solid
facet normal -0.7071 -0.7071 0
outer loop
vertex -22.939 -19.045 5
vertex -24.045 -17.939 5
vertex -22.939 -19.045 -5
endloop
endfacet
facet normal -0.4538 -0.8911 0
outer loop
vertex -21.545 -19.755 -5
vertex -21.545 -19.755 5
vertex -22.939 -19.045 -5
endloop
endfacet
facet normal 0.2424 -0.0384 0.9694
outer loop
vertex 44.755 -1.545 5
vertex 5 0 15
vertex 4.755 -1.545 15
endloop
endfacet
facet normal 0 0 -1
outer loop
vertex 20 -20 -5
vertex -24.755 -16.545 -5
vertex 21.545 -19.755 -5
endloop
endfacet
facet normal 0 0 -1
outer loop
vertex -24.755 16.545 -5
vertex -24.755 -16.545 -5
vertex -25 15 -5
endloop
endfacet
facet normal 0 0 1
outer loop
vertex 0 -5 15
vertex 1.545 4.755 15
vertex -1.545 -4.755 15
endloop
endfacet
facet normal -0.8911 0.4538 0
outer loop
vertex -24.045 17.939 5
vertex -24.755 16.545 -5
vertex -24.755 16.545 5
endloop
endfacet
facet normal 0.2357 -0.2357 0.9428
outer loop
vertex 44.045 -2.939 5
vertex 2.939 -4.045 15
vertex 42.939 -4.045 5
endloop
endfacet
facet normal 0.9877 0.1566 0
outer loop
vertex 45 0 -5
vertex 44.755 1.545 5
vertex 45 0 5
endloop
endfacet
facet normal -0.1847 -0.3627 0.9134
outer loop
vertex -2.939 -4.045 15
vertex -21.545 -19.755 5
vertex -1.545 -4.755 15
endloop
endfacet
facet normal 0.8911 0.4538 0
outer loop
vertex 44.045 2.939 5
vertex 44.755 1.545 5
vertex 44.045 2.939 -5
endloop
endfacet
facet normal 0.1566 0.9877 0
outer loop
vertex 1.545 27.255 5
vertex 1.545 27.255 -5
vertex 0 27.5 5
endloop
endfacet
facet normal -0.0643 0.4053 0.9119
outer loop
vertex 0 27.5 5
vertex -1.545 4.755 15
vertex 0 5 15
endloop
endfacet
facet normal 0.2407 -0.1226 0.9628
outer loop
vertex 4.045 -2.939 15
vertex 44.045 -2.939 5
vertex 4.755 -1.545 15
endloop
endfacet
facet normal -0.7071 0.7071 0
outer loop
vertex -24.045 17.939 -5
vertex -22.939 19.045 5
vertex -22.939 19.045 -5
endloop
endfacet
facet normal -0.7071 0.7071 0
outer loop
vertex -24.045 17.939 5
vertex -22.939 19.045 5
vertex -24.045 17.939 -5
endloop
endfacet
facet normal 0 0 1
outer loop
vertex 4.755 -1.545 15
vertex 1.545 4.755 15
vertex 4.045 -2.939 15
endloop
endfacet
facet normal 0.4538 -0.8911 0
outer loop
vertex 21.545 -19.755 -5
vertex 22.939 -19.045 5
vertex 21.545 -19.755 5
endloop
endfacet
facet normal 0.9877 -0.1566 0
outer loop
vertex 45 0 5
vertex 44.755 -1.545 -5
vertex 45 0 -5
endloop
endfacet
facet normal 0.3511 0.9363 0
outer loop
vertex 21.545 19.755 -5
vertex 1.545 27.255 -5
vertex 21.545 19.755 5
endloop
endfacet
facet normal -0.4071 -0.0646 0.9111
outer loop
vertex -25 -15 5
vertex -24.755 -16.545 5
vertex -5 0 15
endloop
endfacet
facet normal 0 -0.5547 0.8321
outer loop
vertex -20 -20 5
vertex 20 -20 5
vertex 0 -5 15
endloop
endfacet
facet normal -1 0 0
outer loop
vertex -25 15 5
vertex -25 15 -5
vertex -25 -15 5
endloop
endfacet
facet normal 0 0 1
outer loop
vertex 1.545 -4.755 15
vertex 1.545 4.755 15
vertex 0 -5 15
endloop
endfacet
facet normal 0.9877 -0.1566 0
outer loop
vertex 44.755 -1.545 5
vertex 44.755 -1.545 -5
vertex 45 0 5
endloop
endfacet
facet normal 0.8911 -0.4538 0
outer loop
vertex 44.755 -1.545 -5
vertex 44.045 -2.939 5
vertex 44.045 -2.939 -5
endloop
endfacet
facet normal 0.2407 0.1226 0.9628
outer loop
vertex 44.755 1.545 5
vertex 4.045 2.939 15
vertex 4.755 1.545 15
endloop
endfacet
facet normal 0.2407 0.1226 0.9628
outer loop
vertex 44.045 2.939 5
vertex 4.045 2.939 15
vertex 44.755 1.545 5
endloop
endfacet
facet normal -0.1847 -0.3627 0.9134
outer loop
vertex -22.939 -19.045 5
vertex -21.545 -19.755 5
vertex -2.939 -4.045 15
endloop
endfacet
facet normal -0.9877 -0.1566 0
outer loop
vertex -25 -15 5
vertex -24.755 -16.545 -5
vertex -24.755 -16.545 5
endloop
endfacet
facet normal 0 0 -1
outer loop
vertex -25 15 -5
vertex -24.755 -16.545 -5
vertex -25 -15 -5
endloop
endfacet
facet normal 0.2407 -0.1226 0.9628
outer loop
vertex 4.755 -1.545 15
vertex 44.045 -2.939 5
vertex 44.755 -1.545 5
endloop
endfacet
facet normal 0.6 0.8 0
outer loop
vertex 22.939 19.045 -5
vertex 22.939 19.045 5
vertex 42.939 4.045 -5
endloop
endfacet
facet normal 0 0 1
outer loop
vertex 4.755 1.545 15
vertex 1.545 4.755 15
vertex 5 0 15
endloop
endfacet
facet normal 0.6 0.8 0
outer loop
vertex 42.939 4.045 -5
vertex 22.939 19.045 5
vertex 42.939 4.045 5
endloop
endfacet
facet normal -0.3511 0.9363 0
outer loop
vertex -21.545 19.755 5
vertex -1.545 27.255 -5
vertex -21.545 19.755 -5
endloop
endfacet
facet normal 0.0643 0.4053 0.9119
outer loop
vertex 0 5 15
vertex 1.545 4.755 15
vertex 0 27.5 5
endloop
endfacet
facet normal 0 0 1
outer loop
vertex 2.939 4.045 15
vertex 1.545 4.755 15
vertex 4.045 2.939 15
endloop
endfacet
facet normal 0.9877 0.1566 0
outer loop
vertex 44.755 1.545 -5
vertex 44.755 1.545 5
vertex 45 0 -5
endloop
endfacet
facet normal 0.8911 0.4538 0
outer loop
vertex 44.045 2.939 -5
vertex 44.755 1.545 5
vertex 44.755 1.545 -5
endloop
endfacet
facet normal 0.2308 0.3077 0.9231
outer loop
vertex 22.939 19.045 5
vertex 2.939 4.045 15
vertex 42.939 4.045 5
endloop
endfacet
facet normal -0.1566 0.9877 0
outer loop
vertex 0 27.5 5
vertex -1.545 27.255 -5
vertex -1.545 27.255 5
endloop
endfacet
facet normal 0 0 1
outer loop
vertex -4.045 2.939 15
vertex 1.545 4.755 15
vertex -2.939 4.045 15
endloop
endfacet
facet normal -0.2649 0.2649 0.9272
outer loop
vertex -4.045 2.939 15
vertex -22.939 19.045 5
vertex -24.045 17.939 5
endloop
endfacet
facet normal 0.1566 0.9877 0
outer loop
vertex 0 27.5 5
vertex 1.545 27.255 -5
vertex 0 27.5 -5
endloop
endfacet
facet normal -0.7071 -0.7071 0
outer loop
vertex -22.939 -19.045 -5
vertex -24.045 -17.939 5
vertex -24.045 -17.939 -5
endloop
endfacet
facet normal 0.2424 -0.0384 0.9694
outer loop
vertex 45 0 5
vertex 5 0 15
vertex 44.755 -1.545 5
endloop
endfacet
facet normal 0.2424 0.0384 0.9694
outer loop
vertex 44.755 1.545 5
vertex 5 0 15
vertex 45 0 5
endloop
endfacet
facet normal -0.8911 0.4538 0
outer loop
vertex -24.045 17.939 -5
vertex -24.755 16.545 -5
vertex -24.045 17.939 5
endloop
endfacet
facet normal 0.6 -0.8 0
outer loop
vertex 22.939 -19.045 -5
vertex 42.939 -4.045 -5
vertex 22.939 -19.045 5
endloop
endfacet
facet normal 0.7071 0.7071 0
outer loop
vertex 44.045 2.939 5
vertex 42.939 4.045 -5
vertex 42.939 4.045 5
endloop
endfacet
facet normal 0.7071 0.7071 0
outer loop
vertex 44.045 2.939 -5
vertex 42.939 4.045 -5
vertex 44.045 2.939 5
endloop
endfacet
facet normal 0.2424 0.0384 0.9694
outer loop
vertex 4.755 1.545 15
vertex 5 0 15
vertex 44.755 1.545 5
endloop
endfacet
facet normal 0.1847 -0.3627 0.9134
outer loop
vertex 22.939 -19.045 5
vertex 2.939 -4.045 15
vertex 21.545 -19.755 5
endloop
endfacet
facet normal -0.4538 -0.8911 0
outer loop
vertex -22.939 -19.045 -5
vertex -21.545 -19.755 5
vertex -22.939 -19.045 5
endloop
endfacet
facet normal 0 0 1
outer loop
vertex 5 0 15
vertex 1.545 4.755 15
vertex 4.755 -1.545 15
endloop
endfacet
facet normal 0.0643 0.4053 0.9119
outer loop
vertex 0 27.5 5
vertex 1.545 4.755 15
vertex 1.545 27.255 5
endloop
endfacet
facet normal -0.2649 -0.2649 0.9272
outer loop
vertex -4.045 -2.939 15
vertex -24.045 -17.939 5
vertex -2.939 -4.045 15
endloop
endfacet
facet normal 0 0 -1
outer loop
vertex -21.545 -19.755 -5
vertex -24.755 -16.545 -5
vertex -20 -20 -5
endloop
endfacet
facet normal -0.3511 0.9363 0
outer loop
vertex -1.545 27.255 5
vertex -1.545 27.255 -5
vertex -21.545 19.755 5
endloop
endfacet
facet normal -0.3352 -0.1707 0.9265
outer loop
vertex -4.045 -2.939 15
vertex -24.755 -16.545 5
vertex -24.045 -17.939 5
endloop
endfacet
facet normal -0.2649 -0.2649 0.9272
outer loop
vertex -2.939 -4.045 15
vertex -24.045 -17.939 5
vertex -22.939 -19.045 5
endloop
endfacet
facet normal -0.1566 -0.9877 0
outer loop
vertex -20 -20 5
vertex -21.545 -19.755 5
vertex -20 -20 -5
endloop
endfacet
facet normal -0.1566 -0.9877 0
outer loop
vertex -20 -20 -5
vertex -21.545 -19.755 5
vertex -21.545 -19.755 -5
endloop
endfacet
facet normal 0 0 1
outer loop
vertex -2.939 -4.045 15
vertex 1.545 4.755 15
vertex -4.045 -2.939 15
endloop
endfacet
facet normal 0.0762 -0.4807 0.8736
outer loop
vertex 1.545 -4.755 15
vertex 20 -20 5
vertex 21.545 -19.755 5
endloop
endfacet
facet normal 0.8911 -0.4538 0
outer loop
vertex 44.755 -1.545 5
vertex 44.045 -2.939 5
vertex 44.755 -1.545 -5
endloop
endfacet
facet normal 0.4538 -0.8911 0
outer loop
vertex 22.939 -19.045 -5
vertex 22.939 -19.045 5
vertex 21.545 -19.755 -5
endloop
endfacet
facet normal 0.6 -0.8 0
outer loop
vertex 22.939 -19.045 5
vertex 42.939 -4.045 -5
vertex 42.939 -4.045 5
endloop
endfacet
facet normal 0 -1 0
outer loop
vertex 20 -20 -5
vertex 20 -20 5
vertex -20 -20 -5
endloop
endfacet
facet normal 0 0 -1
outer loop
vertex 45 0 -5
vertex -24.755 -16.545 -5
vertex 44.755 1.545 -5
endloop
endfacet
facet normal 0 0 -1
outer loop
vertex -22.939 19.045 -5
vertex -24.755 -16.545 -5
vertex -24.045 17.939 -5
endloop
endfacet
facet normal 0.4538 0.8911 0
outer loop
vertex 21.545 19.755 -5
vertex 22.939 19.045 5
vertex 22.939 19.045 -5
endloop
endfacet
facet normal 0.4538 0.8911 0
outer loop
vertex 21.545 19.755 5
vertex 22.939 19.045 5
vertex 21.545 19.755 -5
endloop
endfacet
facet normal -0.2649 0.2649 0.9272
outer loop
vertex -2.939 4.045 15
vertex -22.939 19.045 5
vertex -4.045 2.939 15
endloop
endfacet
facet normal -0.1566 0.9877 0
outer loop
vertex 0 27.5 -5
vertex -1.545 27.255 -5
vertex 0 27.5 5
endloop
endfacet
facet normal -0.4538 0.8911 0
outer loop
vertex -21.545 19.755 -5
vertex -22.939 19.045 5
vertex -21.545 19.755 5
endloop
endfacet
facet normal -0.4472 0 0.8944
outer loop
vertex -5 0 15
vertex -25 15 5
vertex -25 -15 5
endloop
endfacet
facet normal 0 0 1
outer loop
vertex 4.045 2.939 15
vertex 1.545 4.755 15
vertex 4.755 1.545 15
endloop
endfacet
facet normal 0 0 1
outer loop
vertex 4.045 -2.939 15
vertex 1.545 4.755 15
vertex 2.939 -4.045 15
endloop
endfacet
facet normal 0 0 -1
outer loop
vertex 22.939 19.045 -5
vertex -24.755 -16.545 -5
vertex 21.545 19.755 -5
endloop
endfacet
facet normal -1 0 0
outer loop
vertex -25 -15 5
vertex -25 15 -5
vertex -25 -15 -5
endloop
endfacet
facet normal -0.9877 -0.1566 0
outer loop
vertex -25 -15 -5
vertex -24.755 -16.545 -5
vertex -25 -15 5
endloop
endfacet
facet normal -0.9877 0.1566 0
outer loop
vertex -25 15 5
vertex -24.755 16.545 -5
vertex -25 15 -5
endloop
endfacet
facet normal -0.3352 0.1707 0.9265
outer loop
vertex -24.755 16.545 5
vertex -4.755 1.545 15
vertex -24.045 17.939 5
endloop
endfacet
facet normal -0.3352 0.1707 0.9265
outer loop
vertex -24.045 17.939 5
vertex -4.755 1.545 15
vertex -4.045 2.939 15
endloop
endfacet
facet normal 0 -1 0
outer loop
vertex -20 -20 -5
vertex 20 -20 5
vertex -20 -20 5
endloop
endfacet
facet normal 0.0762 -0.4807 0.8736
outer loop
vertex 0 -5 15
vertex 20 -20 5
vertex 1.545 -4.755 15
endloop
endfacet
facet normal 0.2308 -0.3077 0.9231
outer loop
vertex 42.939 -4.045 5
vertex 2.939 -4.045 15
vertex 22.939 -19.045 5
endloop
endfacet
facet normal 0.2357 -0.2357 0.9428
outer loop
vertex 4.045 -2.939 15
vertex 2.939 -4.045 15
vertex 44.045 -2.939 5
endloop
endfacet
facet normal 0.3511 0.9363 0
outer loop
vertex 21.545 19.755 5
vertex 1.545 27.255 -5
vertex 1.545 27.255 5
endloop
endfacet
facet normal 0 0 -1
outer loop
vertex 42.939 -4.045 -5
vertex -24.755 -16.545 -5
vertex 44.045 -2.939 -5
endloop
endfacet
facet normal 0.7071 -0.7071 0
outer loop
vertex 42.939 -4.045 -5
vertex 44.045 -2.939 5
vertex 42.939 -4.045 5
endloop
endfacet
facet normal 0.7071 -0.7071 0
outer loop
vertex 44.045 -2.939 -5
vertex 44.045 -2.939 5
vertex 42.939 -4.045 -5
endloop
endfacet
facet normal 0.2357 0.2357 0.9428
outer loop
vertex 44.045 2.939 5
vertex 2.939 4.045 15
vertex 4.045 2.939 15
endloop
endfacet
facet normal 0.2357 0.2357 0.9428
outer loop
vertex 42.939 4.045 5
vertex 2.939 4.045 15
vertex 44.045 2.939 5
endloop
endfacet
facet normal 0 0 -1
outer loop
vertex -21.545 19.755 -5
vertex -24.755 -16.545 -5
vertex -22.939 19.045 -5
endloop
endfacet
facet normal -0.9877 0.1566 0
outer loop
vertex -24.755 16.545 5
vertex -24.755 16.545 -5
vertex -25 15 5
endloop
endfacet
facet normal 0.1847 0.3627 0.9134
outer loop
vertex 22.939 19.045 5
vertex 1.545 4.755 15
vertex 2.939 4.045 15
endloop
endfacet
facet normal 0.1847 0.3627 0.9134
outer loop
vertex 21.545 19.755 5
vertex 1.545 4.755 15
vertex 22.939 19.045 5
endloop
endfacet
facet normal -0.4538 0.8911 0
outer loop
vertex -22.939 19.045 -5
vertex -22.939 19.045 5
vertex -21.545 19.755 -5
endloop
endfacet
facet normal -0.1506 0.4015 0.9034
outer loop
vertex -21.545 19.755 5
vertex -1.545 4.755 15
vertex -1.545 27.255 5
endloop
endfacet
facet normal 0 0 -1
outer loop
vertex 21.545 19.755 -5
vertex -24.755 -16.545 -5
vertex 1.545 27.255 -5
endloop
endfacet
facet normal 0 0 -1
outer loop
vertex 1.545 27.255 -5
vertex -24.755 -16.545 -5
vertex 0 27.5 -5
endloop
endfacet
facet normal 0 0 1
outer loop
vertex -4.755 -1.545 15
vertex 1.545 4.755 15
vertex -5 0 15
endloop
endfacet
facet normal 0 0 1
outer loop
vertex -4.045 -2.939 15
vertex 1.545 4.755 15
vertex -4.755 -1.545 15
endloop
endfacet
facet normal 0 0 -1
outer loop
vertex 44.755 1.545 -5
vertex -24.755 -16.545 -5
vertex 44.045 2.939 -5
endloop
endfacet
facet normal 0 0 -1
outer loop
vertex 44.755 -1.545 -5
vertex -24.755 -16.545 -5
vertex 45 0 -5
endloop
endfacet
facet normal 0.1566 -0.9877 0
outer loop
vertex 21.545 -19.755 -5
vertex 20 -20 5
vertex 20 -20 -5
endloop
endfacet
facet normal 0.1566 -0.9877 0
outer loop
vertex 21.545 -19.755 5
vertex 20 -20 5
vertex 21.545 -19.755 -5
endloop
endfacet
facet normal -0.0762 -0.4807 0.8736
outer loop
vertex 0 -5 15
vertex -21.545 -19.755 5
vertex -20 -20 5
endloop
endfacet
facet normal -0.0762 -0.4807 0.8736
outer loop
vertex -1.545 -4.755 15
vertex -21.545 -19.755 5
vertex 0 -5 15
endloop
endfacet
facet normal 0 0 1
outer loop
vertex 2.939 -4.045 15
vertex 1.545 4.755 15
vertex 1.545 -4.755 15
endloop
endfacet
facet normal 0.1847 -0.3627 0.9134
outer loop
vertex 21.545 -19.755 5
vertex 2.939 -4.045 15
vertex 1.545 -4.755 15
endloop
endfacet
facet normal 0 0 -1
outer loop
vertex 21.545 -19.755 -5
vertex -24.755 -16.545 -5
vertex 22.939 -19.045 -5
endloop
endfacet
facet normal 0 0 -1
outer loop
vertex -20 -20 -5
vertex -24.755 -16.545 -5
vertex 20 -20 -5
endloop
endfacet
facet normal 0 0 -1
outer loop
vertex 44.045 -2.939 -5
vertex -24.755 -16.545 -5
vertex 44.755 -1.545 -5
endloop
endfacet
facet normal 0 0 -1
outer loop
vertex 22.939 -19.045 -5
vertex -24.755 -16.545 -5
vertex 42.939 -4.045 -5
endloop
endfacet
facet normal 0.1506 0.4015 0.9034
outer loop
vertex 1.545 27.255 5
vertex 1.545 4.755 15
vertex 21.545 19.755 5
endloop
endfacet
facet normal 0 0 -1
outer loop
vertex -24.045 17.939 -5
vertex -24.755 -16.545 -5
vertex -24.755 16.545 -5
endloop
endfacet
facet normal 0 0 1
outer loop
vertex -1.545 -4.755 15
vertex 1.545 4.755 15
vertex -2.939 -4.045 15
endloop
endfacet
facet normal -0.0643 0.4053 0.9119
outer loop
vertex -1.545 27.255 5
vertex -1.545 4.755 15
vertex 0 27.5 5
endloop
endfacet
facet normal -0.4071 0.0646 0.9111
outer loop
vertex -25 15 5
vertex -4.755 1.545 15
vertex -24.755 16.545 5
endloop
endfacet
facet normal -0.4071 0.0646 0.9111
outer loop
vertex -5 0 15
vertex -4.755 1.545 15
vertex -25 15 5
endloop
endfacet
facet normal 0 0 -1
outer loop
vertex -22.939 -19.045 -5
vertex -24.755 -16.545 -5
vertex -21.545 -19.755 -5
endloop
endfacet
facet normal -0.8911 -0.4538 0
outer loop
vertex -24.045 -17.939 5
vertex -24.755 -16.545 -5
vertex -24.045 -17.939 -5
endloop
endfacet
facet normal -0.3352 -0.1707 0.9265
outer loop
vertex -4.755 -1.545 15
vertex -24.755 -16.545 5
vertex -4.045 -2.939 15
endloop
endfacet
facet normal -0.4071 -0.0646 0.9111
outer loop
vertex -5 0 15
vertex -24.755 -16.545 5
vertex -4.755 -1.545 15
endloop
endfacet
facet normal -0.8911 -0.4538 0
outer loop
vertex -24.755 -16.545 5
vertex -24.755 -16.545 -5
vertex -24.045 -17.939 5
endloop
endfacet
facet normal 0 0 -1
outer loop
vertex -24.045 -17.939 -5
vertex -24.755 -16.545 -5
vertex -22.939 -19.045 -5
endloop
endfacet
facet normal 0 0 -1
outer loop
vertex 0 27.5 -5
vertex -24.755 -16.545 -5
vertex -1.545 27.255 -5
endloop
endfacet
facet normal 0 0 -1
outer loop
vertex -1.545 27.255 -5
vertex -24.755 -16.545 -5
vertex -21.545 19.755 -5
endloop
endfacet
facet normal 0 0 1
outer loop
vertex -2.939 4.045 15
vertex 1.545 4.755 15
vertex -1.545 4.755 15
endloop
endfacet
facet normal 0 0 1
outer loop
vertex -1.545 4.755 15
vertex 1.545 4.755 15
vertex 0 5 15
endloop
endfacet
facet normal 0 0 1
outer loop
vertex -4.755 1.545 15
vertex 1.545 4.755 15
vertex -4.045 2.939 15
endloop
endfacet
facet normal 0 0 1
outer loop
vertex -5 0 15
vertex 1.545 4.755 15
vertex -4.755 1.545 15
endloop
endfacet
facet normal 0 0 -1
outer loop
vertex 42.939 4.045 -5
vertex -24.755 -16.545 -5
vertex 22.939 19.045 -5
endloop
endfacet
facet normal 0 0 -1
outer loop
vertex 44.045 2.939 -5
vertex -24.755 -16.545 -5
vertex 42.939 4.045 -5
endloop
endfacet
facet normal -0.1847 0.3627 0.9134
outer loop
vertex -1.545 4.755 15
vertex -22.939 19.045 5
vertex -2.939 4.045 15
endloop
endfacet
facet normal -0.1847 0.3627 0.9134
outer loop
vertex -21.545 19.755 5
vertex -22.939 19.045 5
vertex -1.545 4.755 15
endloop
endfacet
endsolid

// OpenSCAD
lx=50;
ly=40;
r=5;
h=10;

cx= lx/2 -r;
cy= ly/2 -r;

POINT=[
[cx,cy,0],
[-cx,cy,0],
[-cx,-cy,0],
[cx,-cy,0],
[2*cx,0,0],
[0,1.5*cy,0],
[0,0,h]
];

hull(){
    for(pos=POINT)   
        translate(pos)
            cylinder(r=r, h=h,              center=true, $fn=20);         
} 
